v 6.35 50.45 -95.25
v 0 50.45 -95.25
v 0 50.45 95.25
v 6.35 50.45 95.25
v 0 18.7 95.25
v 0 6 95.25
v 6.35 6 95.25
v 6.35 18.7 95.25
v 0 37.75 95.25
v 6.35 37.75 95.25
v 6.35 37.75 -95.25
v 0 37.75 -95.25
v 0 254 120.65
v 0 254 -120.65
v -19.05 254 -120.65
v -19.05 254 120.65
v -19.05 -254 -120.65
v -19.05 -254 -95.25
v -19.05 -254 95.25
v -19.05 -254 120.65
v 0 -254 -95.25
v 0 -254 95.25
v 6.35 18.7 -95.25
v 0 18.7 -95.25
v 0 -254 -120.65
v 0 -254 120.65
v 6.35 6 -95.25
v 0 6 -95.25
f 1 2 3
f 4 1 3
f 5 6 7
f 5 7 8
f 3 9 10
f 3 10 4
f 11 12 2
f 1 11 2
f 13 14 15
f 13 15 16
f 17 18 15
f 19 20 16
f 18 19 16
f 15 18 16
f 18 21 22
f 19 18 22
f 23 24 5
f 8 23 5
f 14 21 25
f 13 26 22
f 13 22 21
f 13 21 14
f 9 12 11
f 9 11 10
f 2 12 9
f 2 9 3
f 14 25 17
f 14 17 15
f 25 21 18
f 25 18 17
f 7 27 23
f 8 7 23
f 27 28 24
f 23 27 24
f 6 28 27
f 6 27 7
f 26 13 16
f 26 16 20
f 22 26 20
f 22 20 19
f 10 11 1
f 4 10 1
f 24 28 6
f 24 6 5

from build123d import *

# Parameters (mm, degrees)
F0_W     = 12.7
F0_H     = 190.5
F1_DEPTH = 6.35
F0_W_2   = 259.999907
F0_W_3   = 19.05
F2_DEPTH = 19.05


with BuildPart() as f1:
    # F0 (on Right) → F1 (new body)
    with BuildSketch(Plane.YZ):
        with Locations((12.349907, 0)):
            Rectangle(F0_W, F0_H)
        with Locations((44.099907, 0)):
            Rectangle(F0_W, F0_H)
    extrude(amount=F1_DEPTH)


with BuildPart() as f2:
    # F0 (on Right) → F2 (new body)
    with BuildSketch(Plane.YZ):
        Polygon((50.449907, -95.25), (254, -95.25), (254, 120.65), (-254, 120.65), (-254, 95.25), (5.999907, 95.25), (18.699907, 95.25), (37.749907, 95.25), (50.449907, 95.25), align=None)
        with Locations((-124.000046, 0)):
            Rectangle(F0_W_2, F0_H)
        Polygon((-254, -120.65), (254, -120.65), (254, -95.25), (50.449907, -95.25), (37.749907, -95.25), (18.699907, -95.25), (5.999907, -95.25), (-254, -95.25), align=None)
        with Locations((12.349907, 0)):
            Rectangle(F0_W, F0_H)
        with Locations((28.224907, 0)):
            Rectangle(F0_W_3, F0_H)
        with Locations((44.099907, 0)):
            Rectangle(F0_W, F0_H)
    extrude(amount=-F2_DEPTH)


solid = Compound([f1.part, f2.part])
